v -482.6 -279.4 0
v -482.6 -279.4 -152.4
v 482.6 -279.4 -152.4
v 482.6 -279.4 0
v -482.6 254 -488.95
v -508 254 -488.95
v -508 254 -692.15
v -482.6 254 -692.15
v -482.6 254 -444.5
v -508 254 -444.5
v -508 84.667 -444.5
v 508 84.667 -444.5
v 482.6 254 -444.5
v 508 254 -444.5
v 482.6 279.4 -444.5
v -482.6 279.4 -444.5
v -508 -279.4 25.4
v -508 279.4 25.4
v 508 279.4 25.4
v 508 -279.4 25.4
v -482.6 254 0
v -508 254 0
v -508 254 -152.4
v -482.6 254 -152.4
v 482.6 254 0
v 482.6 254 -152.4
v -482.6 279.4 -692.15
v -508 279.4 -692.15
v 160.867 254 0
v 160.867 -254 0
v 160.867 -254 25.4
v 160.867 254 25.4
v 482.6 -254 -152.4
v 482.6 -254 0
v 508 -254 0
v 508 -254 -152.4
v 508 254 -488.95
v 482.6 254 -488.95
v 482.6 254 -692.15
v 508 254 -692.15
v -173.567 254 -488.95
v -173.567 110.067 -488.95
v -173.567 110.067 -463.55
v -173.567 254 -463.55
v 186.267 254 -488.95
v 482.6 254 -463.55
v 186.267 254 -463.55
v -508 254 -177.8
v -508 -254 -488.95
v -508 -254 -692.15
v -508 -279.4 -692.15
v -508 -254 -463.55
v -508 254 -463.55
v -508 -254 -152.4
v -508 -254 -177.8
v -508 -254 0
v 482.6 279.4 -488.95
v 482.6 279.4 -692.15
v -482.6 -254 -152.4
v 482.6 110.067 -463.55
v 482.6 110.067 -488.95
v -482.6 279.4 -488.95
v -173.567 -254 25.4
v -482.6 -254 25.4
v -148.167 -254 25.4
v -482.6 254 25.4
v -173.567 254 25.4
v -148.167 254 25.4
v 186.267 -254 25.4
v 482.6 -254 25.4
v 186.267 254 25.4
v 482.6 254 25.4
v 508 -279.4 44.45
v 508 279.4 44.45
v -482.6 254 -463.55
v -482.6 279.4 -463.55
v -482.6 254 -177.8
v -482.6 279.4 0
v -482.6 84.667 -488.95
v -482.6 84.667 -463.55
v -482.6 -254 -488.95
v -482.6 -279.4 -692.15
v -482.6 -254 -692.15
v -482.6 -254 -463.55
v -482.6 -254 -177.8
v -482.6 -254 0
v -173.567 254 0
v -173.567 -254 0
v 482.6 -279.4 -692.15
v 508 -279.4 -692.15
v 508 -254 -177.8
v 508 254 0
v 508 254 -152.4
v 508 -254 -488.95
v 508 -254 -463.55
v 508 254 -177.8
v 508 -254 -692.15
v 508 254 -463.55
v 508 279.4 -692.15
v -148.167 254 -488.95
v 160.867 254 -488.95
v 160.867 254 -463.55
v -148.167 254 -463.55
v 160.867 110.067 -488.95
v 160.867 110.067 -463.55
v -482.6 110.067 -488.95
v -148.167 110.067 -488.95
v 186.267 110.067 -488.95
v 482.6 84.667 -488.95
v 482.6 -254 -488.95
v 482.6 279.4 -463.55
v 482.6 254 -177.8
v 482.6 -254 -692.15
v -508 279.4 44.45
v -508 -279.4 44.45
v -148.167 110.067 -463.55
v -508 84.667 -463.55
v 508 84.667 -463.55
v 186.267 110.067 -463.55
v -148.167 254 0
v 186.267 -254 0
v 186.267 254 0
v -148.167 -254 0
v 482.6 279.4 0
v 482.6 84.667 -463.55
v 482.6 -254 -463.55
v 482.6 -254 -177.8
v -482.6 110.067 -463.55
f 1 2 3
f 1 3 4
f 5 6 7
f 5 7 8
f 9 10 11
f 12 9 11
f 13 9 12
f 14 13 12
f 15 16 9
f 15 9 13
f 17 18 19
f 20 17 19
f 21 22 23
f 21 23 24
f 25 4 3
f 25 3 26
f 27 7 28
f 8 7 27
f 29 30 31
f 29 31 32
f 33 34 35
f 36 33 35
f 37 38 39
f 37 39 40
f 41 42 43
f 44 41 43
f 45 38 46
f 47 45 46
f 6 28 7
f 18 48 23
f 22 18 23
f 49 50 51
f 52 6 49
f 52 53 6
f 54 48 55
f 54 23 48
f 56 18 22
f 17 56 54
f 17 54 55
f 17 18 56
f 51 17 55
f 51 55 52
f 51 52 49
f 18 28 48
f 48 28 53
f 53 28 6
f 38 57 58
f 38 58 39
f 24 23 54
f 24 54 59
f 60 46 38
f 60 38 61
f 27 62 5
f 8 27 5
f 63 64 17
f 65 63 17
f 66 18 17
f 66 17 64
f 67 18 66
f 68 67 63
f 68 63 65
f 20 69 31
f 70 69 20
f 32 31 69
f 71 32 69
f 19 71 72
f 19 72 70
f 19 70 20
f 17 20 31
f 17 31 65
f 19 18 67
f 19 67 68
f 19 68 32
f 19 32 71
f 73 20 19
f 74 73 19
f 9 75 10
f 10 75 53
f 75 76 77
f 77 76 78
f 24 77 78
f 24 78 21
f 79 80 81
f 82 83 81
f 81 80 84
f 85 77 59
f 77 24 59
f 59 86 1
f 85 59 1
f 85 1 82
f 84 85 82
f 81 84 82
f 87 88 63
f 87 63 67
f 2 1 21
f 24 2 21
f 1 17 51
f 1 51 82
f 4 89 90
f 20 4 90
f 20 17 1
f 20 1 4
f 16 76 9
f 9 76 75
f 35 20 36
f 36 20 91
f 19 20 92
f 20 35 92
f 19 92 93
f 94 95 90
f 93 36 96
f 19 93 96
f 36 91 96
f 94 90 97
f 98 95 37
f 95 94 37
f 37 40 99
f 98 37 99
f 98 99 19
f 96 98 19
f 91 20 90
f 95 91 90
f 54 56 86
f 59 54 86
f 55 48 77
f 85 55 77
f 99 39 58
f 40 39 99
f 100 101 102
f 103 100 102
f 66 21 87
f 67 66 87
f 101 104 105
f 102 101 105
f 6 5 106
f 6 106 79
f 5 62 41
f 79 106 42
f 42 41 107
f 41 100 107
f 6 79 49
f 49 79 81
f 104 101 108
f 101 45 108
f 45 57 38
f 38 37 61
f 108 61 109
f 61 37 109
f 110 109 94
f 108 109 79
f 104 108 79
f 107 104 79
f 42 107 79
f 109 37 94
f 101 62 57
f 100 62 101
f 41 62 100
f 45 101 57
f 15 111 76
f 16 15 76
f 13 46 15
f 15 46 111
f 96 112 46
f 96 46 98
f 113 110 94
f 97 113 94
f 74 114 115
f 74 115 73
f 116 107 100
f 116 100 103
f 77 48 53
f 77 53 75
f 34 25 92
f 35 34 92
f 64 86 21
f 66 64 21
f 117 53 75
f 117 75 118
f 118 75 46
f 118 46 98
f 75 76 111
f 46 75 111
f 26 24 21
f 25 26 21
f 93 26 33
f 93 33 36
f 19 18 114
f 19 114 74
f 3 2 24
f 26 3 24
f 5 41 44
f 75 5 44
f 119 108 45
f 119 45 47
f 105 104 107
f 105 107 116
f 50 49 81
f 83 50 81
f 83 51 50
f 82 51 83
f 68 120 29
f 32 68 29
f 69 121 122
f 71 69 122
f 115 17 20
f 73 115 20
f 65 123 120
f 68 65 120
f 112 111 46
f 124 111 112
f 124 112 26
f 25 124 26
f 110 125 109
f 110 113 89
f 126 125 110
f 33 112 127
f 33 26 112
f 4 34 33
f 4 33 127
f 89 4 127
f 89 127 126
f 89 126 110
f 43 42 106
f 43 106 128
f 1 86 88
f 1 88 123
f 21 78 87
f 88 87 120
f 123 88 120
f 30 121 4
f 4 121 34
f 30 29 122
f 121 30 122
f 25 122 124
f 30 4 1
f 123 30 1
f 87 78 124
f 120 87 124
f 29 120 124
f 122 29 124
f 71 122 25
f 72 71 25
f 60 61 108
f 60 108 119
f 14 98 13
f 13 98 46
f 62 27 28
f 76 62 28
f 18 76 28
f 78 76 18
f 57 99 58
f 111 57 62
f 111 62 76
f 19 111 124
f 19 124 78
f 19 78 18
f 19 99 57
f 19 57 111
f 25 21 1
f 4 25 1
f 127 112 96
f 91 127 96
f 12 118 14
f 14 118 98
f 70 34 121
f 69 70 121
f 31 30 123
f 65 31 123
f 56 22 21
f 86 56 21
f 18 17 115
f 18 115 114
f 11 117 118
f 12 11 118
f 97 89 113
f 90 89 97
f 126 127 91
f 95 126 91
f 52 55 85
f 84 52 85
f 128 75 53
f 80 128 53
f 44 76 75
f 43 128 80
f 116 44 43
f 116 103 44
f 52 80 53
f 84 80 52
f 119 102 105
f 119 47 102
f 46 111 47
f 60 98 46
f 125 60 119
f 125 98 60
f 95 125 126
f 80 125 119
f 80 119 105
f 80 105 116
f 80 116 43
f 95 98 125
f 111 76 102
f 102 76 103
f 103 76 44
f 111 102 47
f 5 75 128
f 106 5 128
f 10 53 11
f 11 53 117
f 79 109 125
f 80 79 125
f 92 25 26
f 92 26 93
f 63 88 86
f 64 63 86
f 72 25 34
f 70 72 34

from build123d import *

# Parameters (mm, degrees)
F4_W      = 1016
F4_H      = 558.8
F4_W_2    = 25.4
F4_H_2    = 508
F5_DEPTH  = 25.4
F6_W      = 1016
F6_H      = 558.8
F7_DEPTH  = 19.05
F8_W      = 25.4
F8_H      = 25.4
F9_DEPTH  = 692.15
F10_W     = 25.4
F10_H     = 25.4
F11_DEPTH = 508
F12_W     = 25.4
F12_H     = 25.4
F13_DEPTH = 508
F14_W     = 25.4
F14_H     = 25.4
F15_DEPTH = 965.2
F16_W     = 25.4
F16_H     = 25.4
F17_DEPTH = 143.9333333333
F19_DEPTH = 19.05
F20_W     = 25.4
F20_H     = 25.4
F21_DEPTH = 508
F22_W     = 25.4
F22_H     = 25.4
F23_DEPTH = 508
F24_W     = 508
F24_H     = 152.4
F24_W_2   = 25.4
F25_DEPTH = 965.2


# Not quite as in the source:
# - a length typed as a fraction of an inch, garbled in the dataset ("3 / 203.2 mm" for 3/8 in), is restored


with BuildPart() as f5:
    # F4 (on Top) → F5 (new body)
    with BuildSketch(Plane.XY):
        Rectangle(F4_W, F4_H)
        Polygon((482.6, 254), (482.6, -254), (186.2666666667, -254), (160.8666666667, -254), (-148.1666666667, -254), (-173.5666666667, -254), (-482.6, -254), (-482.6, 254), (-173.5666666667, 254), (-148.1666666667, 254), (160.8666666667, 254), (186.2666666667, 254), align=None, mode=Mode.SUBTRACT)
        with Locations((-160.8666666667, 0)):
            Rectangle(F4_W_2, F4_H_2)
        with Locations((173.5666666667, 0)):
            Rectangle(F4_W_2, F4_H_2)
    extrude(amount=F5_DEPTH)

    # F8 (on face) → F9 (join)
    with BuildSketch(Plane(origin=(0, 0, 0), x_dir=(1, 0, 0), z_dir=(0, 0, -1))):
        with Locations((-495.3, 266.7)):
            Rectangle(F8_W, F8_H)
        with Locations((-495.3, -266.7)):
            Rectangle(F8_W, F8_H)
        with Locations((495.3, 266.7)):
            Rectangle(F8_W, F8_H)
        with Locations((495.3, -266.7)):
            Rectangle(F8_W, F8_H)
    extrude(amount=F9_DEPTH)

    # F10 (on face) → F11 (join, through all)
    with BuildSketch(Plane.XZ.offset(-254)):
        with Locations((-495.3, -476.25)):
            Rectangle(F10_W, F10_H)
    extrude(amount=F11_DEPTH)

    # F12 (on face) → F13 (join, through all)
    with BuildSketch(Plane.XZ.offset(-254)):
        with Locations((495.3, -476.25)):
            Rectangle(F12_W, F12_H)
    extrude(amount=F13_DEPTH)

    # F14 (on face) → F15 (join, through all)
    with BuildSketch(Plane(origin=(482.6, 0, 0), x_dir=(0, -1, 0), z_dir=(-1, 0, 0))):
        with Locations((-97.3666666667, -476.25)):
            Rectangle(F14_W, F14_H)
        with Locations((-266.7, -476.25)):
            Rectangle(F14_W, F14_H)
    extrude(amount=F15_DEPTH)

    # F16 (on face) → F17 (join, through all)
    with BuildSketch(Plane.XZ.offset(-254)):
        with Locations((-160.8666666667, -476.25)):
            Rectangle(F16_W, F16_H)
        with Locations((173.5666666667, -476.25)):
            Rectangle(F16_W, F16_H)
    extrude(amount=F17_DEPTH)

    # F20 (on face) → F21 (join, through all)
    with BuildSketch(Plane.XZ.offset(-254)):
        with Locations((-495.3, -165.1)):
            Rectangle(F20_W, F20_H)
    extrude(amount=F21_DEPTH)

    # F22 (on face) → F23 (join, through all)
    with BuildSketch(Plane.XZ.offset(-254)):
        with Locations((495.3, -165.1)):
            Rectangle(F22_W, F22_H)
    extrude(amount=F23_DEPTH)


with BuildPart() as f7:
    # F6 (on face) → F7 (new body)
    with BuildSketch(Plane.XY.offset(25.4)):
        Rectangle(F6_W, F6_H)
    extrude(amount=F7_DEPTH)


with BuildPart() as f19:
    # F18 (on face) → F19 (new body)
    with BuildSketch(Plane.XY.offset(-463.55)):
        Polygon((-482.6, 254), (-508, 254), (-508, 84.6666666667), (508, 84.6666666667), (508, 254), (482.6, 254), (482.6, 279.4), (-482.6, 279.4), align=None)
    extrude(amount=F19_DEPTH)


with BuildPart() as f25:
    # F24 (on face) → F25 (new body)
    with BuildSketch(Plane.YZ.offset(-482.6)):
        with Locations((0, -76.2)):
            Rectangle(F24_W, F24_H)
        with Locations((-266.7, -76.2)):
            Rectangle(F24_W_2, F24_H)
    extrude(amount=F25_DEPTH)


solid = Compound([f5.part, f7.part, f19.part, f25.part])
